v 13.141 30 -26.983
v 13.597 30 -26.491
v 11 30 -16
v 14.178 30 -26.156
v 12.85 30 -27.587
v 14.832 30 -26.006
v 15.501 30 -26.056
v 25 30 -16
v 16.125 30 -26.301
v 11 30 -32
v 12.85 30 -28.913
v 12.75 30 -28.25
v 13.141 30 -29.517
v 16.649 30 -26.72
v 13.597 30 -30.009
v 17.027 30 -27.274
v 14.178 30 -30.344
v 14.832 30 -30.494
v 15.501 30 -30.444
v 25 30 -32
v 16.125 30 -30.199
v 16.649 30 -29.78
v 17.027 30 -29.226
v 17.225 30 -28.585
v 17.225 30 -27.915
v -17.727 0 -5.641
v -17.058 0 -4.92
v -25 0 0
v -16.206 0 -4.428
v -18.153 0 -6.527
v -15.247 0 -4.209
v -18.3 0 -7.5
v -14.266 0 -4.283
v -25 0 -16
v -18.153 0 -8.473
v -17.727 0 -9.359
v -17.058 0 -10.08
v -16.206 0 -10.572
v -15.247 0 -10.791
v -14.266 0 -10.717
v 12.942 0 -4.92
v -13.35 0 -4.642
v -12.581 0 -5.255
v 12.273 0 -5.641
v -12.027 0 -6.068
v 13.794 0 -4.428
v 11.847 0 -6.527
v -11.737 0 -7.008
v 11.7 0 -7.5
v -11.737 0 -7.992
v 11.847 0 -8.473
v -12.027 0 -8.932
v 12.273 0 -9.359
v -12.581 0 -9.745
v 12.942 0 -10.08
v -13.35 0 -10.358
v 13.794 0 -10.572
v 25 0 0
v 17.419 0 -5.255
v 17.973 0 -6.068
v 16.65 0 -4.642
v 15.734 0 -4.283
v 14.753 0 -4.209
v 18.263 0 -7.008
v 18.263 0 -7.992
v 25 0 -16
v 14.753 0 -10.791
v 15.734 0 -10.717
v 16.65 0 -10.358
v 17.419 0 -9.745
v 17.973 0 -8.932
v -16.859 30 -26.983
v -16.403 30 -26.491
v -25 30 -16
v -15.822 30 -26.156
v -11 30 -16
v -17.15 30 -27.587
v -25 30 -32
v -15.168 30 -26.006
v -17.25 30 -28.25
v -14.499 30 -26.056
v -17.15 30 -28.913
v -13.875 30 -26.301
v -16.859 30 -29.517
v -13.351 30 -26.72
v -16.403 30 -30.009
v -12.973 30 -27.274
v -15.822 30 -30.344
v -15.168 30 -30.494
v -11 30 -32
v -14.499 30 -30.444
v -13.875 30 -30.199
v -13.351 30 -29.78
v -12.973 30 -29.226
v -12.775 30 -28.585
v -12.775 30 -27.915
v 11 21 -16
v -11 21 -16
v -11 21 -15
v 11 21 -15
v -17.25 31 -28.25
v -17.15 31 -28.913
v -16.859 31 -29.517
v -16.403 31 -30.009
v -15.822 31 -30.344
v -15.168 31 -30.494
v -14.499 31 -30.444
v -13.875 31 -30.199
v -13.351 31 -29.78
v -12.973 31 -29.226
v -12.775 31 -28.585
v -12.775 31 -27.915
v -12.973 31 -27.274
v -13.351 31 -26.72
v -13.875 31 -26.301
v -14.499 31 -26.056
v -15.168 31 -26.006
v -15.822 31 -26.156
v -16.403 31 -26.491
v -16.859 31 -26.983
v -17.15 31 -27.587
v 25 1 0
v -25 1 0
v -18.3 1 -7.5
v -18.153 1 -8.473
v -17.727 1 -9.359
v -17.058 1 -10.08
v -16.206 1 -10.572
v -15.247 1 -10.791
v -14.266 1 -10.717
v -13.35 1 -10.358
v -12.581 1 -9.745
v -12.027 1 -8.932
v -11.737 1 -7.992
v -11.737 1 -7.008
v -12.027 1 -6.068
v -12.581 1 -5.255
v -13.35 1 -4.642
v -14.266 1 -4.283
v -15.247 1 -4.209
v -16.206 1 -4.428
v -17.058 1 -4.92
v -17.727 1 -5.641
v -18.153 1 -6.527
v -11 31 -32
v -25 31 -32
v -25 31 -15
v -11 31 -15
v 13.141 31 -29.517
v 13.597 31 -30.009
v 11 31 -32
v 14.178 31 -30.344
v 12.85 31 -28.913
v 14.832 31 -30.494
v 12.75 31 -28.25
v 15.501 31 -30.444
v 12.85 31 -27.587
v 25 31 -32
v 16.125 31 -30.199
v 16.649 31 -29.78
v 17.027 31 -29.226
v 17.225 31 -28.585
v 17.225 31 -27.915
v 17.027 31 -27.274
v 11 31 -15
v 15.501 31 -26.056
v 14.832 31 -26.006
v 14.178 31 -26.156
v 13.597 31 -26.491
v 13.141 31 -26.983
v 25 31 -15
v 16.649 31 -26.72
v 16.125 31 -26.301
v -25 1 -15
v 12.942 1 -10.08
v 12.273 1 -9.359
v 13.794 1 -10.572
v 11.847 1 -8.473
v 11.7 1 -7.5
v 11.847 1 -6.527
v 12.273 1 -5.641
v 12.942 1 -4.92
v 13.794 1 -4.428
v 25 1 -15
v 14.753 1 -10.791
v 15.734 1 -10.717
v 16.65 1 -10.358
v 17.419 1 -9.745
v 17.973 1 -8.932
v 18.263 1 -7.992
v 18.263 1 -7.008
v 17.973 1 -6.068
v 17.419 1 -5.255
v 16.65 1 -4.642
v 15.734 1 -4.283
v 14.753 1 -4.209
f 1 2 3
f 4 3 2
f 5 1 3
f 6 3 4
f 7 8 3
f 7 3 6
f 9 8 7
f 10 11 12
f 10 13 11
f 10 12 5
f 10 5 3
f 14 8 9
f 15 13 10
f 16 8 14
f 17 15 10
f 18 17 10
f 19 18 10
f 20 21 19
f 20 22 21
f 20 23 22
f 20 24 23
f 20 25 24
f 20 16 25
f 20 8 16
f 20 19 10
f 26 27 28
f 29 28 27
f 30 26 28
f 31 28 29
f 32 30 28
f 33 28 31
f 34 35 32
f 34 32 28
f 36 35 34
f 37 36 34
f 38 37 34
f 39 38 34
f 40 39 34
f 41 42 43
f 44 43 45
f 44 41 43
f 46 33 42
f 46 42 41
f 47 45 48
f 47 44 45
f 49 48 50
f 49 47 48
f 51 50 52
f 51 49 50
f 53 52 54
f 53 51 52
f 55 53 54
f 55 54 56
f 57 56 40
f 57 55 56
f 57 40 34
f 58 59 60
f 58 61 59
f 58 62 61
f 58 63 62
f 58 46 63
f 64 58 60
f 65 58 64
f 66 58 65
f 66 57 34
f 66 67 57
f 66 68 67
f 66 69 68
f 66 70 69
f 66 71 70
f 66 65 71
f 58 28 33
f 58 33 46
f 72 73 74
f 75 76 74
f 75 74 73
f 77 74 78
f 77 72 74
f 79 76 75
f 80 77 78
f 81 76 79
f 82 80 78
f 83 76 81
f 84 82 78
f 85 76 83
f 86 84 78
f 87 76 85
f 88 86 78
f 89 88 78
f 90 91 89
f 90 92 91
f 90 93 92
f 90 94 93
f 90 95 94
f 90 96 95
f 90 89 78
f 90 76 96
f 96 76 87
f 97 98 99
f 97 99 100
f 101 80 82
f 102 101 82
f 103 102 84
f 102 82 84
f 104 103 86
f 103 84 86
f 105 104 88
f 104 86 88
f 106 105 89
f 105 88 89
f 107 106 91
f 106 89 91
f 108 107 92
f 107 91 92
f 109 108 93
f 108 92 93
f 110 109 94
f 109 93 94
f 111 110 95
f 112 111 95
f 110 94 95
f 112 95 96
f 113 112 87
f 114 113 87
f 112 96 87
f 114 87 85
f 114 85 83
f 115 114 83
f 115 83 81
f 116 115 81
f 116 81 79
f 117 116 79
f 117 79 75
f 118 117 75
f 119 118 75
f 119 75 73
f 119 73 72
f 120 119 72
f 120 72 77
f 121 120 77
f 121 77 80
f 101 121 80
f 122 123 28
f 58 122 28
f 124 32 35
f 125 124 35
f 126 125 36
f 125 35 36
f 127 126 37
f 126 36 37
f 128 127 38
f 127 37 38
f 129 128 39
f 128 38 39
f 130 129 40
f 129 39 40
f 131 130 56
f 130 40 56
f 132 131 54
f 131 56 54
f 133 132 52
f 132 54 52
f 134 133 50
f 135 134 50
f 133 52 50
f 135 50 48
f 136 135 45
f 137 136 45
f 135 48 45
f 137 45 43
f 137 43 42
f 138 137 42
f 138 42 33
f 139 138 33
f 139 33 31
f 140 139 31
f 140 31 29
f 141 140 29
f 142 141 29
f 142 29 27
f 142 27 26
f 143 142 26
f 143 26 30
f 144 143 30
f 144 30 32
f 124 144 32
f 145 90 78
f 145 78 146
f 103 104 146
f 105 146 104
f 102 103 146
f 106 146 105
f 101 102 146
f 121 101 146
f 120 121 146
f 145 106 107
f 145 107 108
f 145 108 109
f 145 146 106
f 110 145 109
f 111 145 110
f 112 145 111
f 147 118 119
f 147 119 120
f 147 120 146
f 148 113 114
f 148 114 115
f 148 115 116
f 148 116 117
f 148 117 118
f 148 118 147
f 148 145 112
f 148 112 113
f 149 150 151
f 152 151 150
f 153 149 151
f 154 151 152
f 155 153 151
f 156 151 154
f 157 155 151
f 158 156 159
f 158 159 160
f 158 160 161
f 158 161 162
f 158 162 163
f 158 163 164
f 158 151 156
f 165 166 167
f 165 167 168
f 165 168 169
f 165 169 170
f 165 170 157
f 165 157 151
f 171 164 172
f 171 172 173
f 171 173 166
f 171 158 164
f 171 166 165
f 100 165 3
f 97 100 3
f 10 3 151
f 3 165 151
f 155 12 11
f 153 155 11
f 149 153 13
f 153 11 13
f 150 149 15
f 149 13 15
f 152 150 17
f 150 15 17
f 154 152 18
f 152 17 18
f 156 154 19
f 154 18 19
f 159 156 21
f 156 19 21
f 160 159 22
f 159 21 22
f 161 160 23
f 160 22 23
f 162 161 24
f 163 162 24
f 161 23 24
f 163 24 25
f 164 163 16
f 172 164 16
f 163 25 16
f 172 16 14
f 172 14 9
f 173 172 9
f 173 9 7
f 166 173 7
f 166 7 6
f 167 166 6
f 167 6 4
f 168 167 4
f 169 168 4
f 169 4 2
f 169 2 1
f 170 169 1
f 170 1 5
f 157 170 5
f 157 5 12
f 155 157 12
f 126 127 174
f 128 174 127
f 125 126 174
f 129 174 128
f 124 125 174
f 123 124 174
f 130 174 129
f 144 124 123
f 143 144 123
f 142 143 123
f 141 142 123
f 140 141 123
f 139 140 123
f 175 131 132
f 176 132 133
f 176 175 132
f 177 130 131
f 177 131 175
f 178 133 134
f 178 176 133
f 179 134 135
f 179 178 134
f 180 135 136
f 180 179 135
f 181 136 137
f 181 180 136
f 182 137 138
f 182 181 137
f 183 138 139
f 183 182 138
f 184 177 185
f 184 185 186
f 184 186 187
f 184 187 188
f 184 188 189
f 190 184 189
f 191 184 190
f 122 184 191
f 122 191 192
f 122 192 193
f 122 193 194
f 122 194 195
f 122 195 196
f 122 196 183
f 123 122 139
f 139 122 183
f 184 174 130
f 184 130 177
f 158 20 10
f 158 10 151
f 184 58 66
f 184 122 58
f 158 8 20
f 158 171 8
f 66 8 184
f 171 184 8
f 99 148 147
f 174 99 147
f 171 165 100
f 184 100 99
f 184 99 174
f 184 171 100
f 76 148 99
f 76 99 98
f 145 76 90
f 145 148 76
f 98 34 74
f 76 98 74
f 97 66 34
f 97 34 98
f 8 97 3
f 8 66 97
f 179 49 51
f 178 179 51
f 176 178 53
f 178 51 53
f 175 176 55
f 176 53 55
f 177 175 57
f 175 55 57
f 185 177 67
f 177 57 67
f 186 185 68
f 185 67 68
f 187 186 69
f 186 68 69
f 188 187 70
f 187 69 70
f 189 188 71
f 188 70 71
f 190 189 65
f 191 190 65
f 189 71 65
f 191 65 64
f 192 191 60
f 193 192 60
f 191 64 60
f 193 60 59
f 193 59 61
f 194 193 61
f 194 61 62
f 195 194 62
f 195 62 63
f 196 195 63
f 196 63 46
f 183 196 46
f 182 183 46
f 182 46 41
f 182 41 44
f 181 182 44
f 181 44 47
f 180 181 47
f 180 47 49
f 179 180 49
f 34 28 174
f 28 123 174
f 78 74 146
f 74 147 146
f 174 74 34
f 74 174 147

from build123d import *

# Parameters (mm, degrees)
BOSS_EXTRUDE1_DEPTH  = 25
SKETCH2_W            = 22
SKETCH2_H            = 17
CUT_EXTRUDE1_DEPTH   = 10
M4_CLEARANCE_HOLE1_D = 4.5
M6_CLEARANCE_HOLE1_D = 6.6


with BuildPart() as part:
    # Sketch1 → Boss-Extrude1 (new, symmetric)
    with BuildSketch(Plane(origin=(0, 0, 0), x_dir=(0, 0, -1), z_dir=(1, 0, 0))):
        Polygon((0, 0), (16, 0), (16, 30), (32, 30), (32, 31), (15, 31), (15, 1), (0, 1), align=None)
    extrude(amount=BOSS_EXTRUDE1_DEPTH, both=True)

    # Sketch2 → Cut-Extrude1 (cut)
    with BuildSketch(Plane(origin=(0, 31, 0), x_dir=(1, 0, 0), z_dir=(0, 1, 0))):
        with Locations((0, 23.5)):
            Rectangle(SKETCH2_W, SKETCH2_H)
    extrude(amount=-CUT_EXTRUDE1_DEPTH, mode=Mode.SUBTRACT)

    # M4 Clearance Hole1 (through all)
    with Locations(Plane(origin=(0, 31, 0), x_dir=(1, 0, 0), z_dir=(0, 1, 0))):
        with Locations((-15, 28.25), (15, 28.25)):
            Hole(M4_CLEARANCE_HOLE1_D / 2)

    # M6 Clearance Hole1 (through all)
    with Locations(Plane(origin=(0, 1, 0), x_dir=(1, 0, 0), z_dir=(0, 1, 0))):
        with Locations((-15, 7.5), (15, 7.5)):
            Hole(M6_CLEARANCE_HOLE1_D / 2)


solid = part.part
